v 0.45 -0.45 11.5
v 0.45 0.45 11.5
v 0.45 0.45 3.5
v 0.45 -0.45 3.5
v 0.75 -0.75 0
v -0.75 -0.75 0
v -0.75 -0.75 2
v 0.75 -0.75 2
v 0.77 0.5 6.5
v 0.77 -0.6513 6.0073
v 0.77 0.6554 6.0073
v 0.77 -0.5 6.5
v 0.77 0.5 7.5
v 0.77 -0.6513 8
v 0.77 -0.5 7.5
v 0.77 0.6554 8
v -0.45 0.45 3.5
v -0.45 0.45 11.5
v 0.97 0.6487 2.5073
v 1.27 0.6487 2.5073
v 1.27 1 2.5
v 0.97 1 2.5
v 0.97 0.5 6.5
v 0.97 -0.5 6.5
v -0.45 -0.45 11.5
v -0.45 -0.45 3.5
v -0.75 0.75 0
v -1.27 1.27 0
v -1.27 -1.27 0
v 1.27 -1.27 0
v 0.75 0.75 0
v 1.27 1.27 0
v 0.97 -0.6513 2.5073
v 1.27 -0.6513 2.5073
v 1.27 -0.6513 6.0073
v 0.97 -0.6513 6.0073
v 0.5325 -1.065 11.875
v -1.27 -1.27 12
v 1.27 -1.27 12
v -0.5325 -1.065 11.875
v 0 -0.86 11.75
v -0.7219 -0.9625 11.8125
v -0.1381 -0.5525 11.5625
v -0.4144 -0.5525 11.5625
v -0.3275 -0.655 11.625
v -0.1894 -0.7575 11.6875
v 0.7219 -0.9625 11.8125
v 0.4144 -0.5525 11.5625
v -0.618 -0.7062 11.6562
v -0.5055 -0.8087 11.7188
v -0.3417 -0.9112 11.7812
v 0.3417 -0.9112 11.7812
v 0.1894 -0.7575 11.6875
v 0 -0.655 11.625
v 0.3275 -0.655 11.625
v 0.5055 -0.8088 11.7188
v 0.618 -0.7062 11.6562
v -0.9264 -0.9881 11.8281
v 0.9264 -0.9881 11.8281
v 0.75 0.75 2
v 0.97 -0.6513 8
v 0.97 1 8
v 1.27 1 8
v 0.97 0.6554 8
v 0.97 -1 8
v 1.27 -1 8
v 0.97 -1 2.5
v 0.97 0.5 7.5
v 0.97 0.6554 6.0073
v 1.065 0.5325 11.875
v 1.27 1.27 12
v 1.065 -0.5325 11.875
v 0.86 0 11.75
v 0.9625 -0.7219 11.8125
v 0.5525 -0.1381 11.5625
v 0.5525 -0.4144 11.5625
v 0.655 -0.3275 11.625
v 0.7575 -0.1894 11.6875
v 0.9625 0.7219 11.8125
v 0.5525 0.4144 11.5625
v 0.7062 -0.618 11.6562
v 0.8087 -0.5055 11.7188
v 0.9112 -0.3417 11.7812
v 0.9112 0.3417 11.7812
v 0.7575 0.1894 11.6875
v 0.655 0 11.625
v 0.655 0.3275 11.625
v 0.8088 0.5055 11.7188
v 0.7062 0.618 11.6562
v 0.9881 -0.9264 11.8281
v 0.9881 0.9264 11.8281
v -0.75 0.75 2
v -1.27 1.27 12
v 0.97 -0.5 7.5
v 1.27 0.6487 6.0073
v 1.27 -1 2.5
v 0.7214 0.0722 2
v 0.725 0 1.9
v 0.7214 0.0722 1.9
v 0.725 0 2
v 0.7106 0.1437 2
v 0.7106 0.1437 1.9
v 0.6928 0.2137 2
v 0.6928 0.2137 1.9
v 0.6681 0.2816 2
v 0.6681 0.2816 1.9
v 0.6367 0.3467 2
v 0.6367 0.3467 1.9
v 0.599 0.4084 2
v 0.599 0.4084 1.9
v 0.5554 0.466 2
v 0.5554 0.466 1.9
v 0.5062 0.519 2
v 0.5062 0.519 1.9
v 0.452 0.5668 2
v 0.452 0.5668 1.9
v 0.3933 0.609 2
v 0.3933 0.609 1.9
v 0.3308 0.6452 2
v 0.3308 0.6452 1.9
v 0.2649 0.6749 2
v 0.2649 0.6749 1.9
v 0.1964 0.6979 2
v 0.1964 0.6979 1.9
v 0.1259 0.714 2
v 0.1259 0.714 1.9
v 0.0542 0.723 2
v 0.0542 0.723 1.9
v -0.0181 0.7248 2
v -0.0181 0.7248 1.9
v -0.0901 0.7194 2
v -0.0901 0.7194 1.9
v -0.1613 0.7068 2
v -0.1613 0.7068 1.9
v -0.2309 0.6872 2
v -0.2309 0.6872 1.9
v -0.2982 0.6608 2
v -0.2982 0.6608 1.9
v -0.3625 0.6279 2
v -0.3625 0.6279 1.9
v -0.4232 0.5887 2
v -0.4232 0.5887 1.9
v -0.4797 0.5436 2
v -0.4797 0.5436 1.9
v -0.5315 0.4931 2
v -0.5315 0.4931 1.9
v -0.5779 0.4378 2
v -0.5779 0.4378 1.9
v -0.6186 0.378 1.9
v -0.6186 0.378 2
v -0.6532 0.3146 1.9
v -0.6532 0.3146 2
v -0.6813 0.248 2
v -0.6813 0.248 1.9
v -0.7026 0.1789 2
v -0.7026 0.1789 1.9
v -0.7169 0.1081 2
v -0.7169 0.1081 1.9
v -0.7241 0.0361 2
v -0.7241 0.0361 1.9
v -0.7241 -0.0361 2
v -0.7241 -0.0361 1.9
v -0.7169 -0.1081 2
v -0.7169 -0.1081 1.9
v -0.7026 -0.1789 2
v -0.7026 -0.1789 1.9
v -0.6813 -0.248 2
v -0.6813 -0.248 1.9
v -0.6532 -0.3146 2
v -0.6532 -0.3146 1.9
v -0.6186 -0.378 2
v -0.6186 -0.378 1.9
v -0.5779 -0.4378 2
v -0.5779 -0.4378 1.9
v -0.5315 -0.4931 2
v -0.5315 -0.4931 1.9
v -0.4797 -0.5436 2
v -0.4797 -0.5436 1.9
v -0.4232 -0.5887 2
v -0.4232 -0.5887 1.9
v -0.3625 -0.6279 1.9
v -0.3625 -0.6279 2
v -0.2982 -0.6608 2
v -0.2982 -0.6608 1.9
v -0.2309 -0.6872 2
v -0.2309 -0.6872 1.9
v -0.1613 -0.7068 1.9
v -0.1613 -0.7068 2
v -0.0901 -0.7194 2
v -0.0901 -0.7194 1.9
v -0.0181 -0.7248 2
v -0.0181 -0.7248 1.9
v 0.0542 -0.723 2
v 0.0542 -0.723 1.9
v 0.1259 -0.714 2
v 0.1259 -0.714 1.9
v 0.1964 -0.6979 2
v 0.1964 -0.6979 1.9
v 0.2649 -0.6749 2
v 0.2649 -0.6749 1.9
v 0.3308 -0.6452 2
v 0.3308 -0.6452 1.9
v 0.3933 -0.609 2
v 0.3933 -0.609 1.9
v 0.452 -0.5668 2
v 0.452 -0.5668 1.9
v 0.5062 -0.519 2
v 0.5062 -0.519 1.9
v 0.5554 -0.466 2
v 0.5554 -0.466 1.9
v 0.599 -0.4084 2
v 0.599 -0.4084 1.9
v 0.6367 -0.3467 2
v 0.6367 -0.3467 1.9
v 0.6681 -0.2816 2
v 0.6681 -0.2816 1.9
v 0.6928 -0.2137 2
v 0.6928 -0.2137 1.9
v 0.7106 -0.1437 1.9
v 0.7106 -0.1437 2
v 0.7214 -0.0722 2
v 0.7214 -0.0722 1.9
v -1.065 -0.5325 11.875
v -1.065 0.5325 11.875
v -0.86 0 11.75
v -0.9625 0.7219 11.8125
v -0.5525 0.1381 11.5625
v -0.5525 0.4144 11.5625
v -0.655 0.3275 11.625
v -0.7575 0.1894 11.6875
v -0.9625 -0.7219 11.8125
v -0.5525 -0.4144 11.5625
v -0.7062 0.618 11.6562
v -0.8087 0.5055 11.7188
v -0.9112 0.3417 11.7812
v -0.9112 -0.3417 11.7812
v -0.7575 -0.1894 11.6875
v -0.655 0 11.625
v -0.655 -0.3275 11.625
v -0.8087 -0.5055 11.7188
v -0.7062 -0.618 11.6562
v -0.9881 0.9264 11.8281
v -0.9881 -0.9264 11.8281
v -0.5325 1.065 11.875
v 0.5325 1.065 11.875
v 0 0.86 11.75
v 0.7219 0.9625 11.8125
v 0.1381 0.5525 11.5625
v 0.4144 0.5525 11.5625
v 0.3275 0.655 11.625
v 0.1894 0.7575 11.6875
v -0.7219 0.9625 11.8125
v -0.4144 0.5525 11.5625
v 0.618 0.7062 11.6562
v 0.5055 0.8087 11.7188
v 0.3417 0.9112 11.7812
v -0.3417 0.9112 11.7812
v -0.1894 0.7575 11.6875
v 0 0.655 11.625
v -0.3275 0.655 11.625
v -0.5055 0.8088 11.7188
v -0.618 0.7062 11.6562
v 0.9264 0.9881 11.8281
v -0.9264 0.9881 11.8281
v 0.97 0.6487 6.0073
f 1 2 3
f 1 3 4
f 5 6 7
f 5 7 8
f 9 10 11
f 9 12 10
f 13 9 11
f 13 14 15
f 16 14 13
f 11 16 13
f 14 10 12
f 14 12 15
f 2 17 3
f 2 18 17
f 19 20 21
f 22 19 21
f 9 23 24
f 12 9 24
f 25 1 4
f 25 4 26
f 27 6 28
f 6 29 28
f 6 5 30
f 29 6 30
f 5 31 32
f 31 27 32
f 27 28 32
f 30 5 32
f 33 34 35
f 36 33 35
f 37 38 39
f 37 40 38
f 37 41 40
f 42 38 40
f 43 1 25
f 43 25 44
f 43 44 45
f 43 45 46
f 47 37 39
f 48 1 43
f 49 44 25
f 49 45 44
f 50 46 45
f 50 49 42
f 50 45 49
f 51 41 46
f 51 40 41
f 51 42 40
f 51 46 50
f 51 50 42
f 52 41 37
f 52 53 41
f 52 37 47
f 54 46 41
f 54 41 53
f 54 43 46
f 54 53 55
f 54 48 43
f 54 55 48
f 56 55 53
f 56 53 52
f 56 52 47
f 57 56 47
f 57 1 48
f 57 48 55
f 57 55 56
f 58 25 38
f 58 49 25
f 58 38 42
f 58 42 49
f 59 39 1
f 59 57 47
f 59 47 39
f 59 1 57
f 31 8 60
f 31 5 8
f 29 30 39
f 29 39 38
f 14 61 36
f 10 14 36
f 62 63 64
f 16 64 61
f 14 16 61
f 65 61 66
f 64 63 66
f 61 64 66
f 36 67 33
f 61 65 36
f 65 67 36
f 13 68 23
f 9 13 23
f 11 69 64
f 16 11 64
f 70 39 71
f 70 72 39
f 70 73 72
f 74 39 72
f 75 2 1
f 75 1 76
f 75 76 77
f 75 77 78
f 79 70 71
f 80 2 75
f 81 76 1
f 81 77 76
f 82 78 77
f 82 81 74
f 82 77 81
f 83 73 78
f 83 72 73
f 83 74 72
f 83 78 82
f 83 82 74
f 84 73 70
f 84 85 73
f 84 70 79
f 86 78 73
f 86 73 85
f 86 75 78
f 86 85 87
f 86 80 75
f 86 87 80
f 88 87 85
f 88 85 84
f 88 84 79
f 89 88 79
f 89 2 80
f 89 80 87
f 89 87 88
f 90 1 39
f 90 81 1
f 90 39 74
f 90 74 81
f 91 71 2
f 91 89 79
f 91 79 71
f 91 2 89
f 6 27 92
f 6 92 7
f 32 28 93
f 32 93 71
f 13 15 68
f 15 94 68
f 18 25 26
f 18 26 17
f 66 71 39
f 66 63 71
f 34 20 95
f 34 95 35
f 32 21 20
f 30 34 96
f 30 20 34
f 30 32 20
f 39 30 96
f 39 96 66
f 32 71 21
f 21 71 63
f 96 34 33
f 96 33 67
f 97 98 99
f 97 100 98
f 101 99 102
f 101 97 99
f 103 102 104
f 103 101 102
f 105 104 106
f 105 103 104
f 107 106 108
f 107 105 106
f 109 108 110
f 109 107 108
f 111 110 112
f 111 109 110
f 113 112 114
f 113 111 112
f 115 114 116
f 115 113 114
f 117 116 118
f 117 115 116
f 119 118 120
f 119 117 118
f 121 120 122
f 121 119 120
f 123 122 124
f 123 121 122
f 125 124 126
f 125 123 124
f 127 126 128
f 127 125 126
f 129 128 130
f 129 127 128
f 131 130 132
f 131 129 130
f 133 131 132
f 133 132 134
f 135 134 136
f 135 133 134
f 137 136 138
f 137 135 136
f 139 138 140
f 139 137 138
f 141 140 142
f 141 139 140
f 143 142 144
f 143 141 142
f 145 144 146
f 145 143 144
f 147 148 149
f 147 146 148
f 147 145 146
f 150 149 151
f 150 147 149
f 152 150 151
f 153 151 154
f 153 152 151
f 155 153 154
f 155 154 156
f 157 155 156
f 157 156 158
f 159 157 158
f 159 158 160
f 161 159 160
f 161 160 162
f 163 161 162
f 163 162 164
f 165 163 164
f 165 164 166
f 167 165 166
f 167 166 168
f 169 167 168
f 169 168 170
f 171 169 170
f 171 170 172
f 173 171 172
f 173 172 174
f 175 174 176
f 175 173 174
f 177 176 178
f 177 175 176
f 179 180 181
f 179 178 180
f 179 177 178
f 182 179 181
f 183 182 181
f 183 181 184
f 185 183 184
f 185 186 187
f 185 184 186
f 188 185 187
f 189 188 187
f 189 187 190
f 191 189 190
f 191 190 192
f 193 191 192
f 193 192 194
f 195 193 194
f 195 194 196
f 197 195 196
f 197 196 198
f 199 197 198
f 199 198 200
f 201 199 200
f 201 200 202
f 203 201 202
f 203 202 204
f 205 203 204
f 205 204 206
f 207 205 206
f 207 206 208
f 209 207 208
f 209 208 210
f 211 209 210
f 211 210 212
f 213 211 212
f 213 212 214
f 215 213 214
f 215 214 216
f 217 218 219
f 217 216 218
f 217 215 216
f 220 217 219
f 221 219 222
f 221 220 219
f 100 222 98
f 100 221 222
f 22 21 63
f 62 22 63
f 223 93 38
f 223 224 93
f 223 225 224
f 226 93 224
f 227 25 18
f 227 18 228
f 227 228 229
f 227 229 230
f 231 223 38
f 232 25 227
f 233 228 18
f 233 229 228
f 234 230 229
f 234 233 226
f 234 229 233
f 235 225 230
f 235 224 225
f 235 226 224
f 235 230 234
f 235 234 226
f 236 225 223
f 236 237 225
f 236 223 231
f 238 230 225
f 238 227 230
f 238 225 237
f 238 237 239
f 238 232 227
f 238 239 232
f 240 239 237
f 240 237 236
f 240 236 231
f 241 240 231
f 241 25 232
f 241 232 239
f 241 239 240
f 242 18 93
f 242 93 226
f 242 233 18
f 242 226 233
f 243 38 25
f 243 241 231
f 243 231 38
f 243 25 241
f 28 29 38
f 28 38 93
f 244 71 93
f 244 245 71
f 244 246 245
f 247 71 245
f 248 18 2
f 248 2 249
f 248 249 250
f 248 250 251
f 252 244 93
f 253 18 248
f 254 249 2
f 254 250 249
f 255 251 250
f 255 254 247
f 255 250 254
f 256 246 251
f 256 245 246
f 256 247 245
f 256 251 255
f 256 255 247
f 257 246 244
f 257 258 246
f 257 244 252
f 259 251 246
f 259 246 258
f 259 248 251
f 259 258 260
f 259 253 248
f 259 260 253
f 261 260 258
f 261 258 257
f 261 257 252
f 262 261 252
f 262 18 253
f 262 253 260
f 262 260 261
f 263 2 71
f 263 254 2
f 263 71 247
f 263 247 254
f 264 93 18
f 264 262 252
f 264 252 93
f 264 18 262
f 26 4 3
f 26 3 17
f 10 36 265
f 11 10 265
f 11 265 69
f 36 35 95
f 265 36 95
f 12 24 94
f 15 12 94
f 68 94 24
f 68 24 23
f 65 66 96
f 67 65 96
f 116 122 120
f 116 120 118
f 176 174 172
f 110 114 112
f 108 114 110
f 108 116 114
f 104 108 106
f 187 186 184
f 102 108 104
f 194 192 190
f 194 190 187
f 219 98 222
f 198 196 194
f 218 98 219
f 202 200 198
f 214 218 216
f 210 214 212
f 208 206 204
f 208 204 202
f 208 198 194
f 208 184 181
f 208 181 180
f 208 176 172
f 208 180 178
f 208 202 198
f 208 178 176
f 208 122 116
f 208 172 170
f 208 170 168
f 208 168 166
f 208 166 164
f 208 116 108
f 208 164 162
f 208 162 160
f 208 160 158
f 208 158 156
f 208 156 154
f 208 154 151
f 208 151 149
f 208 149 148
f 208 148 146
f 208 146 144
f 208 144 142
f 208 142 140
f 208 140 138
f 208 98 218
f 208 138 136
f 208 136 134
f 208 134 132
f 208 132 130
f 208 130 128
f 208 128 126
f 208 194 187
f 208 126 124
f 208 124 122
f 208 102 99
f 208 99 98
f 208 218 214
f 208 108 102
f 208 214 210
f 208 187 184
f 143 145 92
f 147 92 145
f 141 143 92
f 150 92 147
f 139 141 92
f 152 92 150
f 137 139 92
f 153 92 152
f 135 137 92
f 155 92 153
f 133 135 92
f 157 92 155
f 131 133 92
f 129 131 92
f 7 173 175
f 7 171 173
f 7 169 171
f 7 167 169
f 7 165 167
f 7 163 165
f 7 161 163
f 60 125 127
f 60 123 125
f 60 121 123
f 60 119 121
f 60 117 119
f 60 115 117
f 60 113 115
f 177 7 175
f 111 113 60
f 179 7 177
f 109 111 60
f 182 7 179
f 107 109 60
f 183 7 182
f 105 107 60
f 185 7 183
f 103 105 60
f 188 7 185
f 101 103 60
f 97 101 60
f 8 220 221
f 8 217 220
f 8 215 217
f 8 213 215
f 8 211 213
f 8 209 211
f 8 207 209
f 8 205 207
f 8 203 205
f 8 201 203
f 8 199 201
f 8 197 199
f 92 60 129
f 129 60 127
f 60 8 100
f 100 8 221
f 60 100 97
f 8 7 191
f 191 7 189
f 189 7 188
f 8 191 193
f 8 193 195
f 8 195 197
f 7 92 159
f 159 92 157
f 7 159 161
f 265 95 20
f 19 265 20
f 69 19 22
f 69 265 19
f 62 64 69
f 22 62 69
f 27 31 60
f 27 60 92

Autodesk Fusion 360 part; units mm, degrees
sketch "Sketch1" plane through (0, 0, 0) normal (0, 0, 1) x (1, 0, 0)
  line L0 (1.27, -1.27) -> (-1.27, -1.27)
  line L1 (-1.27, -1.27) -> (-1.27, 1.27)
  line L2 (-1.27, 1.27) -> (1.27, 1.27)
  line L3 (1.27, 1.27) -> (1.27, -1.27)
  line L4 (1.27, -1.27) -> (-1.27, 1.27) construction
  line L5 (-1.27, -1.27) -> (1.27, 1.27) construction
  dimension "d1" = 2.54
  dimension "d2" = 2.54
extrude "Extrude1" add sketch "Sketch1" along normal blind 12
sketch "Sketch2" plane through (0, 0, 12) normal (0, 0, 1) x (-1, 0, 0)
  line L0 (-1.27, -1.27) -> (1.27, -1.27)
  line L1 (1.27, -1.27) -> (1.27, 1.27)
  line L2 (1.27, 1.27) -> (-1.27, 1.27)
  line L3 (-1.27, 1.27) -> (-1.27, -1.27)
  line L4 (-0.45, 0.45) -> (0.45, 0.45)
  line L5 (0.45, 0.45) -> (0.45, -0.45)
  line L6 (0.45, -0.45) -> (-0.45, -0.45)
  line L7 (-0.45, -0.45) -> (-0.45, 0.45)
  line L8 (-0.45, 0.45) -> (0.45, -0.45) construction
  line L9 (0.45, 0.45) -> (-0.45, -0.45) construction
  dimension "d5" = 0.9
  dimension "d6" = 0.9
extrude "Extrude2" cut sketch "Sketch2" against normal blind 0.5 contours L4 L5 L6 L7
loft "Loft1" cut profiles "Sketch2" section 1 section 2 face at (0.15, -0.15, 11.5)
extrude "Extrude3" cut 1 faces at (0.15, -0.15, 11.5) along direction (0, 0, -1) blind 8
sketch "Sketch3" plane through (1.27, 0, 0) normal (1, 0, 0) x (0, 1, 0)
  line L0 (-1.27, 0) -> (1.27, 0)
  line L1 (1.27, 0) -> (1.27, 12)
  line L2 (1.27, 12) -> (-1.27, 12)
  line L3 (-1.27, 12) -> (-1.27, 0)
  line L4 (1, 8) -> (-1, 8)
  line L5 (-1, 8) -> (-1, 2.5)
  line L6 (-1, 2.5) -> (1, 2.5)
  line L7 (1, 2.5) -> (1, 8)
  line L8 (1, 8) -> (-1, 2.5) construction
  line L9 (-1, 8) -> (1, 2.5) construction
  line L10 (0.6487, 2.5073) -> (-0.6513, 2.5073)
  line L11 (-0.6513, 2.5073) -> (-0.6513, 6.0073)
  line L12 (-0.6513, 6.0073) -> (0.6487, 6.0073)
  line L13 (0.6487, 6.0073) -> (0.6487, 2.5073)
  line L14 (0.6487, 2.5073) -> (-0.6513, 6.0073) construction
  line L15 (-0.6513, 2.5073) -> (0.6487, 6.0073) construction
  line L16 (-0.6513, 6.0073) -> (0.6554, 6.0073)
  line L17 (0.6554, 6.0073) -> (0.6554, 8.0073)
  line L18 (0.6554, 8.0073) -> (-0.6513, 8.0073)
  line L19 (-0.6513, 8.0073) -> (-0.6513, 6.0073)
  line L20 (0.5, 6.5) -> (-0.5, 6.5)
  line L21 (-0.5, 6.5) -> (-0.5, 7.5)
  line L22 (-0.5, 7.5) -> (0.5, 7.5)
  line L23 (0.5, 7.5) -> (0.5, 6.5)
  line L24 (0.5, 6.5) -> (-0.5, 7.5) construction
  line L25 (-0.5, 6.5) -> (0.5, 7.5) construction
  line L26 (-1.27, 6) -> (-0.6513, 6.0073)
  line L27 (0.6554, 6.0073) -> (1.27, 6)
  line L28 (0.6487, 2.5073) -> (1, 2.5)
  line L29 (-0.6513, 2.5073) -> (-1, 2.5)
  point P0 (0, 5.25)
  point P1 (-0.0013, 4.2573)
  point P2 (0, 7)
  dimension "d11" = 5.5
  dimension "d12" = 2.5
  dimension "d13" = 1.3
  dimension "d14" = 3.5
  dimension "d15" = 2
  dimension "d16" = 1
  dimension "d17" = 1
extrude "Extrude4" cut sketch "Sketch3" against normal blind 0.3 contours L5 L11 L26 L29 | L4 L5 L19 L26 | L4 L7 L17 L27 | L7 L13 L16 L27 L28
extrude "Extrude5" cut sketch "Sketch3" against normal blind 0.5 contours L4 L12 L16 L17 L19
extrude "Extrude6" cut sketch "Sketch3" against normal blind 0.3 contours L20 L21 L22 L23
sketch "Sketch4" plane through (0, 0, 0) normal (0, 0, -1) x (1, 0, 0)
  line L0 (-1.27, -1.27) -> (1.27, -1.27)
  line L1 (1.27, -1.27) -> (1.27, 1.27)
  line L2 (1.27, 1.27) -> (-1.27, 1.27)
  line L3 (-1.27, 1.27) -> (-1.27, -1.27)
  line L4 (0.75, -0.75) -> (-0.75, -0.75)
  line L5 (-0.75, -0.75) -> (-0.75, 0.75)
  line L6 (-0.75, 0.75) -> (0.75, 0.75)
  line L7 (0.75, 0.75) -> (0.75, -0.75)
  line L8 (0.75, -0.75) -> (-0.75, 0.75) construction
  line L9 (-0.75, -0.75) -> (0.75, 0.75) construction
  dimension "d24" = 1.5
  dimension "d25" = 1.5
extrude "Extrude7" cut sketch "Sketch4" against normal blind 2 contours L4 L5 L6 L7
sketch "Sketch5" plane through (0, 0, 2) normal (0, 0, -1) x (1, 0, 0)
  line L0 (0.75, 0.75) -> (-0.75, 0.75)
  line L1 (-0.75, 0.75) -> (-0.75, -0.75)
  line L2 (-0.75, -0.75) -> (0.75, -0.75)
  line L3 (0.75, -0.75) -> (0.75, 0.75)
  circle A0 centre (0, 0) radius 0.725
  dimension "d28" = 1.45
extrude "Extrude8" add sketch "Sketch5" along normal blind 0.1 contours A0
